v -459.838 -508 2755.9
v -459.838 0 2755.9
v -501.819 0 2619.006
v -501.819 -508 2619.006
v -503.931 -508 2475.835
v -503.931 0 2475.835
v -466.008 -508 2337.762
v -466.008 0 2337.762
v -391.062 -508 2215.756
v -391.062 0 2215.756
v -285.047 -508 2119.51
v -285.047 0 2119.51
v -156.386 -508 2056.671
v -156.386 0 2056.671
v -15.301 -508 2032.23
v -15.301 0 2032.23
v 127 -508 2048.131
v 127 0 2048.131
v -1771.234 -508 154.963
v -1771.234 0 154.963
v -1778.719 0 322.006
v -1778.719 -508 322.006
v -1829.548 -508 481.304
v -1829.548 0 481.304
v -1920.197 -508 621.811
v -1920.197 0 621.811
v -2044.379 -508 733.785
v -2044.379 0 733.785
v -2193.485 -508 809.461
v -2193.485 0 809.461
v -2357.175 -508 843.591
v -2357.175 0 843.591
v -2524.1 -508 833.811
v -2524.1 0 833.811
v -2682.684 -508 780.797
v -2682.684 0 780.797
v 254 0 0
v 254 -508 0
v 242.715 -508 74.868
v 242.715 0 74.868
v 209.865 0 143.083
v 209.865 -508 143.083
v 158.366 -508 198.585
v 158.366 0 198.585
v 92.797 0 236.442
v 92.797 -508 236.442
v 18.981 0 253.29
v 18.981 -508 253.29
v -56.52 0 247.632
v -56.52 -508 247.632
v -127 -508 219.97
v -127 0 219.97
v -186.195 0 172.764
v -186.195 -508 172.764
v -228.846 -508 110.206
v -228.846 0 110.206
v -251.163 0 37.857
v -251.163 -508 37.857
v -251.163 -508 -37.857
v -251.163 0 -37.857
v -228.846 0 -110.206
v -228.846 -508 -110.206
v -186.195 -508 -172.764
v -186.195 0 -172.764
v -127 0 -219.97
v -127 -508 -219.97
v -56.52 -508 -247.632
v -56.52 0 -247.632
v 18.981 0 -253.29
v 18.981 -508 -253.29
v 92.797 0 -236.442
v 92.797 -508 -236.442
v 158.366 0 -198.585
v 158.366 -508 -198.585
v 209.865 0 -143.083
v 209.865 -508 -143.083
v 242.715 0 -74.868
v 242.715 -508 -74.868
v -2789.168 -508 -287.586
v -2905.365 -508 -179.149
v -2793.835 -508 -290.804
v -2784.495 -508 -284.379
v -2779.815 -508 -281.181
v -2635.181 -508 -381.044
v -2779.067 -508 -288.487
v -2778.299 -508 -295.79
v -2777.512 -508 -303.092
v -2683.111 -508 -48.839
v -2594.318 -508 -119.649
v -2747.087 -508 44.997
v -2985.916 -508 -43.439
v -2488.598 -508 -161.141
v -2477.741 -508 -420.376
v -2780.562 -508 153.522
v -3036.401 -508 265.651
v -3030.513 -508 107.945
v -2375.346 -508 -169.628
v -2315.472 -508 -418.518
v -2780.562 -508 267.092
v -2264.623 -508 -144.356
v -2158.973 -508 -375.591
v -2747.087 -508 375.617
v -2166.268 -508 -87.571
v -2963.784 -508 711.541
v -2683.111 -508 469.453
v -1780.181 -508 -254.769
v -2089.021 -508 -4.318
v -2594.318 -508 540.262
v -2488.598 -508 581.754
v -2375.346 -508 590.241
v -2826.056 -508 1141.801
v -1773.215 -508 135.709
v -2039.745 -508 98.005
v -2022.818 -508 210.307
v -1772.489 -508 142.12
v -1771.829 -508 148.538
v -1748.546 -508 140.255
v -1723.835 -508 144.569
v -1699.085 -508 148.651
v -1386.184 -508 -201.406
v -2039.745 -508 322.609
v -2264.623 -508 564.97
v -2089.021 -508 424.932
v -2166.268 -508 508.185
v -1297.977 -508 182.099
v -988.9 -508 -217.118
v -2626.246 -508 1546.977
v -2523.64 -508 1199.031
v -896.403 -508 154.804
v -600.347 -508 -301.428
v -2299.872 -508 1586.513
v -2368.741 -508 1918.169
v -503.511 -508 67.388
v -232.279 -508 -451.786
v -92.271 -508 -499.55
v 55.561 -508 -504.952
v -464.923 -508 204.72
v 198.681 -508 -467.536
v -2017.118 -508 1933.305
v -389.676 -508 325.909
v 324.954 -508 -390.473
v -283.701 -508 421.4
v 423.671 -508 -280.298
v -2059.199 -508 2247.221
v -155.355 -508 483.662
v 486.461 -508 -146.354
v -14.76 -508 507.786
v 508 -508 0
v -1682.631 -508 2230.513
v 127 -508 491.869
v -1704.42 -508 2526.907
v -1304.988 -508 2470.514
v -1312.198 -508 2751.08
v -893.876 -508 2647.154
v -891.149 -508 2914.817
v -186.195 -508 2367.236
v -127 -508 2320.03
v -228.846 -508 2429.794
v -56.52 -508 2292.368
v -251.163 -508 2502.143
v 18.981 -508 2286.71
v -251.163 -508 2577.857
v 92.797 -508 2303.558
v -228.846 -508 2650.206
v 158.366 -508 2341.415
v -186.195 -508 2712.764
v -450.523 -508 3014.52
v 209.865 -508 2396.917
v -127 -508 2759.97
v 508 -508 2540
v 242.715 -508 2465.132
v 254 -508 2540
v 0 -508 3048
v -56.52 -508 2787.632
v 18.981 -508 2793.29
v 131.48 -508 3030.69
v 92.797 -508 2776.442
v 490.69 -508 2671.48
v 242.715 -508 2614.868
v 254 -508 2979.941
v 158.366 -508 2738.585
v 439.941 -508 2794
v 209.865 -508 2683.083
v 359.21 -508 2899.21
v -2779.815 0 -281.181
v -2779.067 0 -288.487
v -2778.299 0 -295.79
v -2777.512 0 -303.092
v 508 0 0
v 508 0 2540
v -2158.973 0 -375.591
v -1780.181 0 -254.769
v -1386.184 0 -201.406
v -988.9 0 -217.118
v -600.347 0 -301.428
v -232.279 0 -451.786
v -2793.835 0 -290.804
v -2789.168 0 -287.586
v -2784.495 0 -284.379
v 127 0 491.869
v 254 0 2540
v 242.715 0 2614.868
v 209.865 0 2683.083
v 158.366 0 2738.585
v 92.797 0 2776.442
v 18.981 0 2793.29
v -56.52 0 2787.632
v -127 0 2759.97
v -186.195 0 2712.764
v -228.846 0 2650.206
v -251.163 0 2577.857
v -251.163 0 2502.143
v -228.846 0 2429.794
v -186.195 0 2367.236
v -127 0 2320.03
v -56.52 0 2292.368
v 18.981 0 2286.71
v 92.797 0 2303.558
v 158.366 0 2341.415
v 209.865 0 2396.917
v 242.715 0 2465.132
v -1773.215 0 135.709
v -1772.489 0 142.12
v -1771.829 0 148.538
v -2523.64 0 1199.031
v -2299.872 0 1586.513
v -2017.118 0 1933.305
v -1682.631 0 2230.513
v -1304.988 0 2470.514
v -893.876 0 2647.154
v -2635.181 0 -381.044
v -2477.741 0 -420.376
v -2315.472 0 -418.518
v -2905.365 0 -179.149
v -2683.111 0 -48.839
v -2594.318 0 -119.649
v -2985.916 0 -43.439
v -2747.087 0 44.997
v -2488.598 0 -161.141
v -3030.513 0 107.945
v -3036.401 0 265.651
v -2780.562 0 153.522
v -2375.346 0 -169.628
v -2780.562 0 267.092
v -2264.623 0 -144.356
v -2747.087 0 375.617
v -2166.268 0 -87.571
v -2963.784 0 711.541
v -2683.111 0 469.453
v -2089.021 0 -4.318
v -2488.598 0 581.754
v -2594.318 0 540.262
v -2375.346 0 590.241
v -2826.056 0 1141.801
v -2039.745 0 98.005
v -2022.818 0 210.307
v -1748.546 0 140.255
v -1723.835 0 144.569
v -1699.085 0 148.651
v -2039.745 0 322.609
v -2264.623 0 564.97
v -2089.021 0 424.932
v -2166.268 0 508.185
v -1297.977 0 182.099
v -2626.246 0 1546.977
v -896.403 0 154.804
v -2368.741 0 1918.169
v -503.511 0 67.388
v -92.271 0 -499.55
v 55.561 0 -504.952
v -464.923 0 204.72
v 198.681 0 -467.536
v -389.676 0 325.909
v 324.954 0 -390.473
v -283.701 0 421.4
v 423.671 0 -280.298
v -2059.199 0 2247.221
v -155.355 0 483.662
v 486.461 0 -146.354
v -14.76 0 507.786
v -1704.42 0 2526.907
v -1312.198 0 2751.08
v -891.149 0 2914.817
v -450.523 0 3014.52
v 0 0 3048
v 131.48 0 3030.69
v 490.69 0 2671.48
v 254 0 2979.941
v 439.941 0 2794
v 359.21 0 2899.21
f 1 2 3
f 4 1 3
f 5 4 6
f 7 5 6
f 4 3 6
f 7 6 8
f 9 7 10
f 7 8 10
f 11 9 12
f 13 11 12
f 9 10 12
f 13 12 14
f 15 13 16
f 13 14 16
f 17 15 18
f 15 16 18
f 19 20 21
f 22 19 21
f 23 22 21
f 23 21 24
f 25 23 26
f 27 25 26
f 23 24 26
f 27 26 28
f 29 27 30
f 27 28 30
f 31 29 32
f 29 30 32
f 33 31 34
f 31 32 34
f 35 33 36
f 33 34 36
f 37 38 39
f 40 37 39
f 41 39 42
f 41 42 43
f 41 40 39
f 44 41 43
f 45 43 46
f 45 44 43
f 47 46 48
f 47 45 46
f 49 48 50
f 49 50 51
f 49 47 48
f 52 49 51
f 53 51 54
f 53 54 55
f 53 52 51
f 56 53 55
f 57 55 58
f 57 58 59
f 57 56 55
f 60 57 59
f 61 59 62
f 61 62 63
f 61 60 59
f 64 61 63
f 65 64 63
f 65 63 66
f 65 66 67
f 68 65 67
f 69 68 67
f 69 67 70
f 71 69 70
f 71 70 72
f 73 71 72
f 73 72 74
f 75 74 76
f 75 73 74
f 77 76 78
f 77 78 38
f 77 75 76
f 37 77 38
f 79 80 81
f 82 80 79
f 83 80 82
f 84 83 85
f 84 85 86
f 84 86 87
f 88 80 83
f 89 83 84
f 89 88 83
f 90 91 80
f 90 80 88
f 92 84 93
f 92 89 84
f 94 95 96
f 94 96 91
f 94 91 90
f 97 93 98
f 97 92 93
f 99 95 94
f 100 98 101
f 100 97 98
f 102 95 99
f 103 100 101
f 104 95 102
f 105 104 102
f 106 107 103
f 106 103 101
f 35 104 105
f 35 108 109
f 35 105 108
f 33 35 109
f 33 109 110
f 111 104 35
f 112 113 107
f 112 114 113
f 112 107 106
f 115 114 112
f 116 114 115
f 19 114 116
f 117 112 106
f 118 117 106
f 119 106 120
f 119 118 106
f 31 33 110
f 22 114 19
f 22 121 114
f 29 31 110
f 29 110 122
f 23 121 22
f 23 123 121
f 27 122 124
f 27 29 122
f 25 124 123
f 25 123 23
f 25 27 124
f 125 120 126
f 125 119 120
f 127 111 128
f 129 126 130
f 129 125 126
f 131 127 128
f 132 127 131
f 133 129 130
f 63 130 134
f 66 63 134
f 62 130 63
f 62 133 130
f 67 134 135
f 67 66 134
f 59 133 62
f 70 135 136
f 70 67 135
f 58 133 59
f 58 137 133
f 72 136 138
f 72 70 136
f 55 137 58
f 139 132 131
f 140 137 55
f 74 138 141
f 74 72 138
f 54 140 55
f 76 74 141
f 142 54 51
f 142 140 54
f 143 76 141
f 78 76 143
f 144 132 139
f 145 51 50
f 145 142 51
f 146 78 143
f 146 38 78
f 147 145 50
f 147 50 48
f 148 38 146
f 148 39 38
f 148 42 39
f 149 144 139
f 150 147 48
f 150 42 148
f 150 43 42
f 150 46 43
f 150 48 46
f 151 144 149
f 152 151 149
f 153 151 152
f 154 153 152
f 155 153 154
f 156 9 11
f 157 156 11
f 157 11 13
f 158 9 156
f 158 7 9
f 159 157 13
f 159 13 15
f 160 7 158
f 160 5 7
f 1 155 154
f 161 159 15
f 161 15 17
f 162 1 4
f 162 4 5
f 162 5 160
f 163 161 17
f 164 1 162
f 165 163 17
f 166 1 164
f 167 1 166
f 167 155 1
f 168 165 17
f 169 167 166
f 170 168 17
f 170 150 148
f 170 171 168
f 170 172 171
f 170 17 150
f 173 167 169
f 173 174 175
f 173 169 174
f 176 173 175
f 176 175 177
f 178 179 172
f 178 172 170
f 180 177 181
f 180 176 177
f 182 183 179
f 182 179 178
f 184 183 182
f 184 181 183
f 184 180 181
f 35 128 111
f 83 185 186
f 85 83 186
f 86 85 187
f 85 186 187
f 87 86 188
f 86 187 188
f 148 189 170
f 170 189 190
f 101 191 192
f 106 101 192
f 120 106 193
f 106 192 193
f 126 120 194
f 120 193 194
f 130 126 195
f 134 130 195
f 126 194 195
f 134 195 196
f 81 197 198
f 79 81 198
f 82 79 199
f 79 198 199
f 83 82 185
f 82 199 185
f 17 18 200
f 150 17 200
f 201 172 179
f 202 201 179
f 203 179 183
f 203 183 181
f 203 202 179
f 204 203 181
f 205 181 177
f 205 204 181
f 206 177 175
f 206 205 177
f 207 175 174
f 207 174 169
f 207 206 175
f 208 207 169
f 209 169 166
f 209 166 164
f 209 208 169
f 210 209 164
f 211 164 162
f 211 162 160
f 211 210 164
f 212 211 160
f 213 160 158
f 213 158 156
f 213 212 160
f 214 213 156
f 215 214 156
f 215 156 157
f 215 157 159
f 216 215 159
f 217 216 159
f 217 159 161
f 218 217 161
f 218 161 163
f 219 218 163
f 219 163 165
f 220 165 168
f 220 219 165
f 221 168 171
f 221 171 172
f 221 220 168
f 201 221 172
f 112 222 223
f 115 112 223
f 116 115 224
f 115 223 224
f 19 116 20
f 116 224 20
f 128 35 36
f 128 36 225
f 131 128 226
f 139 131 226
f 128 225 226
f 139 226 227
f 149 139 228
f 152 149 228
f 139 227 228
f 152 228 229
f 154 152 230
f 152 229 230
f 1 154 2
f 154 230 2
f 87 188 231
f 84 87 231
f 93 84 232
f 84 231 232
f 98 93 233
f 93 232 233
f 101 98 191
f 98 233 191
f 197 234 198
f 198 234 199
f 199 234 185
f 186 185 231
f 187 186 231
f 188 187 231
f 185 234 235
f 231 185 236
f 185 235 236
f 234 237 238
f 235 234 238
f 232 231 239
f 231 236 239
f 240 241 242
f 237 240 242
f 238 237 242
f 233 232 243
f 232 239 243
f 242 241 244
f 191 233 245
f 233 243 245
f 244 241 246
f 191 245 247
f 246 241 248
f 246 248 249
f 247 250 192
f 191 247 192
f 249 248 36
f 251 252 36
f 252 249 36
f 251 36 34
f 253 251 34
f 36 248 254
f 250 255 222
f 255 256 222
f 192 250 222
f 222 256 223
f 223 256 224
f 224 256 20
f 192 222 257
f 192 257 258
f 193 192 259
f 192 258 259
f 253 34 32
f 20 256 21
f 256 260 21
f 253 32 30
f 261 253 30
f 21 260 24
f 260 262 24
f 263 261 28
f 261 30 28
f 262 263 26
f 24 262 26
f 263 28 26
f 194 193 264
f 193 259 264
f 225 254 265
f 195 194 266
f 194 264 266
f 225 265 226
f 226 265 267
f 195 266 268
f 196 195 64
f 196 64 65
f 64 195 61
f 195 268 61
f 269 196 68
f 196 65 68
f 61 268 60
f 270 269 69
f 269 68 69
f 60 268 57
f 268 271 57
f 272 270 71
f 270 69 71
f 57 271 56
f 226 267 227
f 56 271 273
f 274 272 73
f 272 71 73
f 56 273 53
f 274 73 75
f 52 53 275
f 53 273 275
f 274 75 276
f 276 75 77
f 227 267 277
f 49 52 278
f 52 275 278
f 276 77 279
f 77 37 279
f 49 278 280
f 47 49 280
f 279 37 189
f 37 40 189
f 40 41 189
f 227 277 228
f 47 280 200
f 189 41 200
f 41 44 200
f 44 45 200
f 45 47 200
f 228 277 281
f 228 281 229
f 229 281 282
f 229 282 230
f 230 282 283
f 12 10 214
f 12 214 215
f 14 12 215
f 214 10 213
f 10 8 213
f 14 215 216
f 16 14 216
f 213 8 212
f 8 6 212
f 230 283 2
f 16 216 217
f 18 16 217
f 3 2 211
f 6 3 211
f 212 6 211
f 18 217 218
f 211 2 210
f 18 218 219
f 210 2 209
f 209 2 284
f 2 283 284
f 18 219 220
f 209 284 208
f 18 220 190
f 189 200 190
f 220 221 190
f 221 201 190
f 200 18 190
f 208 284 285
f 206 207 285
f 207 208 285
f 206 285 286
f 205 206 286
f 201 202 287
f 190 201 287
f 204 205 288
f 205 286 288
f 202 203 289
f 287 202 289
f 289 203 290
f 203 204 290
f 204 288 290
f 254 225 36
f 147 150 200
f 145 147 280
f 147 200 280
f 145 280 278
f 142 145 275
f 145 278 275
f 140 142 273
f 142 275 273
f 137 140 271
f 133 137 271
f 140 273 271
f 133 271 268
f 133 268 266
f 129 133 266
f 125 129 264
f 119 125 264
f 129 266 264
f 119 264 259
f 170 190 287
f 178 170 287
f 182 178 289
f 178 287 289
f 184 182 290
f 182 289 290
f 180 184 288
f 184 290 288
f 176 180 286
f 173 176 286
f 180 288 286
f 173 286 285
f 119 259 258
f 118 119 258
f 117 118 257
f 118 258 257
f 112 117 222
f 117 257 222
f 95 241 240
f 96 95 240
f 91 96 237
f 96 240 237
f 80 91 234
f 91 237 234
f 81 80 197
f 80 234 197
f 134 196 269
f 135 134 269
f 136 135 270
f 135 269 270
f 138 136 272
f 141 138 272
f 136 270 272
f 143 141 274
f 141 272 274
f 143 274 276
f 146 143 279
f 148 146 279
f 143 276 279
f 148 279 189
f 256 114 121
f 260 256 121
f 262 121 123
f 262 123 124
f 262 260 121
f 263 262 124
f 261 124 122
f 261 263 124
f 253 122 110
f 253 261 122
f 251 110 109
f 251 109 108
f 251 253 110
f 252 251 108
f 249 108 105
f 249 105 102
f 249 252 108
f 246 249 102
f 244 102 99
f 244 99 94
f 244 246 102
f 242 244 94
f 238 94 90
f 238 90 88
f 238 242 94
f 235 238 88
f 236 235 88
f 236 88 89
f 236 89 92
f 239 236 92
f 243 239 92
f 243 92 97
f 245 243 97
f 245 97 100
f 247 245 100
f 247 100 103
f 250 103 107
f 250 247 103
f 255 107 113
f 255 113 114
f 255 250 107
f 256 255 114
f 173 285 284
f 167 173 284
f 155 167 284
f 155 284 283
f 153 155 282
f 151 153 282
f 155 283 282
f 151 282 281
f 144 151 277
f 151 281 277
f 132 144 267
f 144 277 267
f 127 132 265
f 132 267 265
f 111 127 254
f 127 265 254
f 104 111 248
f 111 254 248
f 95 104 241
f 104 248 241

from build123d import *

# Parameters (mm, degrees)
F0_R     = 381
F0_R_2   = 254
F1_DEPTH = 508


with BuildPart() as f1:
    # F0 (on Front) → F1 (new body)
    with BuildSketch(Plane.XZ):
        with BuildLine():
            ThreePointArc((-2158.973337, -375.590953), (-1187.199374, -200.608411), (-232.278772, -451.78598))
            ThreePointArc((-232.278772, -451.78598), (264.63785, -433.625193), (508, 0))
            Line((508, 0), (508, 2540))
            ThreePointArc((508, 2540), (359.210245, 2899.210245), (0, 3048))
            ThreePointArc((0, 3048), (-2059.198953, 2247.221323), (-3036.40144, 265.650704))
            ThreePointArc((-3036.40144, 265.650704), (-2985.916007, -43.438508), (-2793.834553, -290.803896))
            ThreePointArc((-2793.834553, -290.803896), (-2786.832608, -285.981278), (-2779.815325, -281.181006))
            ThreePointArc((-2779.815325, -281.181006), (-2778.685135, -292.13853), (-2777.511752, -303.091513))
            ThreePointArc((-2777.511752, -303.091513), (-2477.740666, -420.375689), (-2158.973337, -375.590953))
        make_face()
        with Locations((-2403.817806, 210.306807)):
            Circle(F0_R, mode=Mode.SUBTRACT)
        Circle(F0_R_2, mode=Mode.SUBTRACT)
        with BuildLine():
            Line((127, 2048.131115), (127, 491.868885))
            ThreePointArc((127, 491.868885), (-283.700841, 421.399849), (-503.510599, 67.387511))
            ThreePointArc((-503.510599, 67.387511), (-1096.67461, 176.037713), (-1699.08507, 148.650682))
            ThreePointArc((-1699.08507, 148.650682), (-1736.195558, 142.441443), (-1773.214755, 135.709277))
            ThreePointArc((-1773.214755, 135.709277), (-1772.151102, 145.328547), (-1771.234173, 154.962911))
            ThreePointArc((-1771.234173, 154.962911), (-2044.379314, 733.784572), (-2682.683819, 780.796726))
            ThreePointArc((-2682.683819, 780.796726), (-1855.833891, 2088.615946), (-459.838222, 2755.9))
            ThreePointArc((-459.838222, 2755.9), (-391.06204, 2215.755523), (127, 2048.131115))
        make_face(mode=Mode.SUBTRACT)
        with Locations((0, 2540)):
            Circle(F0_R_2, mode=Mode.SUBTRACT)
    extrude(amount=F1_DEPTH)


solid = f1.part
